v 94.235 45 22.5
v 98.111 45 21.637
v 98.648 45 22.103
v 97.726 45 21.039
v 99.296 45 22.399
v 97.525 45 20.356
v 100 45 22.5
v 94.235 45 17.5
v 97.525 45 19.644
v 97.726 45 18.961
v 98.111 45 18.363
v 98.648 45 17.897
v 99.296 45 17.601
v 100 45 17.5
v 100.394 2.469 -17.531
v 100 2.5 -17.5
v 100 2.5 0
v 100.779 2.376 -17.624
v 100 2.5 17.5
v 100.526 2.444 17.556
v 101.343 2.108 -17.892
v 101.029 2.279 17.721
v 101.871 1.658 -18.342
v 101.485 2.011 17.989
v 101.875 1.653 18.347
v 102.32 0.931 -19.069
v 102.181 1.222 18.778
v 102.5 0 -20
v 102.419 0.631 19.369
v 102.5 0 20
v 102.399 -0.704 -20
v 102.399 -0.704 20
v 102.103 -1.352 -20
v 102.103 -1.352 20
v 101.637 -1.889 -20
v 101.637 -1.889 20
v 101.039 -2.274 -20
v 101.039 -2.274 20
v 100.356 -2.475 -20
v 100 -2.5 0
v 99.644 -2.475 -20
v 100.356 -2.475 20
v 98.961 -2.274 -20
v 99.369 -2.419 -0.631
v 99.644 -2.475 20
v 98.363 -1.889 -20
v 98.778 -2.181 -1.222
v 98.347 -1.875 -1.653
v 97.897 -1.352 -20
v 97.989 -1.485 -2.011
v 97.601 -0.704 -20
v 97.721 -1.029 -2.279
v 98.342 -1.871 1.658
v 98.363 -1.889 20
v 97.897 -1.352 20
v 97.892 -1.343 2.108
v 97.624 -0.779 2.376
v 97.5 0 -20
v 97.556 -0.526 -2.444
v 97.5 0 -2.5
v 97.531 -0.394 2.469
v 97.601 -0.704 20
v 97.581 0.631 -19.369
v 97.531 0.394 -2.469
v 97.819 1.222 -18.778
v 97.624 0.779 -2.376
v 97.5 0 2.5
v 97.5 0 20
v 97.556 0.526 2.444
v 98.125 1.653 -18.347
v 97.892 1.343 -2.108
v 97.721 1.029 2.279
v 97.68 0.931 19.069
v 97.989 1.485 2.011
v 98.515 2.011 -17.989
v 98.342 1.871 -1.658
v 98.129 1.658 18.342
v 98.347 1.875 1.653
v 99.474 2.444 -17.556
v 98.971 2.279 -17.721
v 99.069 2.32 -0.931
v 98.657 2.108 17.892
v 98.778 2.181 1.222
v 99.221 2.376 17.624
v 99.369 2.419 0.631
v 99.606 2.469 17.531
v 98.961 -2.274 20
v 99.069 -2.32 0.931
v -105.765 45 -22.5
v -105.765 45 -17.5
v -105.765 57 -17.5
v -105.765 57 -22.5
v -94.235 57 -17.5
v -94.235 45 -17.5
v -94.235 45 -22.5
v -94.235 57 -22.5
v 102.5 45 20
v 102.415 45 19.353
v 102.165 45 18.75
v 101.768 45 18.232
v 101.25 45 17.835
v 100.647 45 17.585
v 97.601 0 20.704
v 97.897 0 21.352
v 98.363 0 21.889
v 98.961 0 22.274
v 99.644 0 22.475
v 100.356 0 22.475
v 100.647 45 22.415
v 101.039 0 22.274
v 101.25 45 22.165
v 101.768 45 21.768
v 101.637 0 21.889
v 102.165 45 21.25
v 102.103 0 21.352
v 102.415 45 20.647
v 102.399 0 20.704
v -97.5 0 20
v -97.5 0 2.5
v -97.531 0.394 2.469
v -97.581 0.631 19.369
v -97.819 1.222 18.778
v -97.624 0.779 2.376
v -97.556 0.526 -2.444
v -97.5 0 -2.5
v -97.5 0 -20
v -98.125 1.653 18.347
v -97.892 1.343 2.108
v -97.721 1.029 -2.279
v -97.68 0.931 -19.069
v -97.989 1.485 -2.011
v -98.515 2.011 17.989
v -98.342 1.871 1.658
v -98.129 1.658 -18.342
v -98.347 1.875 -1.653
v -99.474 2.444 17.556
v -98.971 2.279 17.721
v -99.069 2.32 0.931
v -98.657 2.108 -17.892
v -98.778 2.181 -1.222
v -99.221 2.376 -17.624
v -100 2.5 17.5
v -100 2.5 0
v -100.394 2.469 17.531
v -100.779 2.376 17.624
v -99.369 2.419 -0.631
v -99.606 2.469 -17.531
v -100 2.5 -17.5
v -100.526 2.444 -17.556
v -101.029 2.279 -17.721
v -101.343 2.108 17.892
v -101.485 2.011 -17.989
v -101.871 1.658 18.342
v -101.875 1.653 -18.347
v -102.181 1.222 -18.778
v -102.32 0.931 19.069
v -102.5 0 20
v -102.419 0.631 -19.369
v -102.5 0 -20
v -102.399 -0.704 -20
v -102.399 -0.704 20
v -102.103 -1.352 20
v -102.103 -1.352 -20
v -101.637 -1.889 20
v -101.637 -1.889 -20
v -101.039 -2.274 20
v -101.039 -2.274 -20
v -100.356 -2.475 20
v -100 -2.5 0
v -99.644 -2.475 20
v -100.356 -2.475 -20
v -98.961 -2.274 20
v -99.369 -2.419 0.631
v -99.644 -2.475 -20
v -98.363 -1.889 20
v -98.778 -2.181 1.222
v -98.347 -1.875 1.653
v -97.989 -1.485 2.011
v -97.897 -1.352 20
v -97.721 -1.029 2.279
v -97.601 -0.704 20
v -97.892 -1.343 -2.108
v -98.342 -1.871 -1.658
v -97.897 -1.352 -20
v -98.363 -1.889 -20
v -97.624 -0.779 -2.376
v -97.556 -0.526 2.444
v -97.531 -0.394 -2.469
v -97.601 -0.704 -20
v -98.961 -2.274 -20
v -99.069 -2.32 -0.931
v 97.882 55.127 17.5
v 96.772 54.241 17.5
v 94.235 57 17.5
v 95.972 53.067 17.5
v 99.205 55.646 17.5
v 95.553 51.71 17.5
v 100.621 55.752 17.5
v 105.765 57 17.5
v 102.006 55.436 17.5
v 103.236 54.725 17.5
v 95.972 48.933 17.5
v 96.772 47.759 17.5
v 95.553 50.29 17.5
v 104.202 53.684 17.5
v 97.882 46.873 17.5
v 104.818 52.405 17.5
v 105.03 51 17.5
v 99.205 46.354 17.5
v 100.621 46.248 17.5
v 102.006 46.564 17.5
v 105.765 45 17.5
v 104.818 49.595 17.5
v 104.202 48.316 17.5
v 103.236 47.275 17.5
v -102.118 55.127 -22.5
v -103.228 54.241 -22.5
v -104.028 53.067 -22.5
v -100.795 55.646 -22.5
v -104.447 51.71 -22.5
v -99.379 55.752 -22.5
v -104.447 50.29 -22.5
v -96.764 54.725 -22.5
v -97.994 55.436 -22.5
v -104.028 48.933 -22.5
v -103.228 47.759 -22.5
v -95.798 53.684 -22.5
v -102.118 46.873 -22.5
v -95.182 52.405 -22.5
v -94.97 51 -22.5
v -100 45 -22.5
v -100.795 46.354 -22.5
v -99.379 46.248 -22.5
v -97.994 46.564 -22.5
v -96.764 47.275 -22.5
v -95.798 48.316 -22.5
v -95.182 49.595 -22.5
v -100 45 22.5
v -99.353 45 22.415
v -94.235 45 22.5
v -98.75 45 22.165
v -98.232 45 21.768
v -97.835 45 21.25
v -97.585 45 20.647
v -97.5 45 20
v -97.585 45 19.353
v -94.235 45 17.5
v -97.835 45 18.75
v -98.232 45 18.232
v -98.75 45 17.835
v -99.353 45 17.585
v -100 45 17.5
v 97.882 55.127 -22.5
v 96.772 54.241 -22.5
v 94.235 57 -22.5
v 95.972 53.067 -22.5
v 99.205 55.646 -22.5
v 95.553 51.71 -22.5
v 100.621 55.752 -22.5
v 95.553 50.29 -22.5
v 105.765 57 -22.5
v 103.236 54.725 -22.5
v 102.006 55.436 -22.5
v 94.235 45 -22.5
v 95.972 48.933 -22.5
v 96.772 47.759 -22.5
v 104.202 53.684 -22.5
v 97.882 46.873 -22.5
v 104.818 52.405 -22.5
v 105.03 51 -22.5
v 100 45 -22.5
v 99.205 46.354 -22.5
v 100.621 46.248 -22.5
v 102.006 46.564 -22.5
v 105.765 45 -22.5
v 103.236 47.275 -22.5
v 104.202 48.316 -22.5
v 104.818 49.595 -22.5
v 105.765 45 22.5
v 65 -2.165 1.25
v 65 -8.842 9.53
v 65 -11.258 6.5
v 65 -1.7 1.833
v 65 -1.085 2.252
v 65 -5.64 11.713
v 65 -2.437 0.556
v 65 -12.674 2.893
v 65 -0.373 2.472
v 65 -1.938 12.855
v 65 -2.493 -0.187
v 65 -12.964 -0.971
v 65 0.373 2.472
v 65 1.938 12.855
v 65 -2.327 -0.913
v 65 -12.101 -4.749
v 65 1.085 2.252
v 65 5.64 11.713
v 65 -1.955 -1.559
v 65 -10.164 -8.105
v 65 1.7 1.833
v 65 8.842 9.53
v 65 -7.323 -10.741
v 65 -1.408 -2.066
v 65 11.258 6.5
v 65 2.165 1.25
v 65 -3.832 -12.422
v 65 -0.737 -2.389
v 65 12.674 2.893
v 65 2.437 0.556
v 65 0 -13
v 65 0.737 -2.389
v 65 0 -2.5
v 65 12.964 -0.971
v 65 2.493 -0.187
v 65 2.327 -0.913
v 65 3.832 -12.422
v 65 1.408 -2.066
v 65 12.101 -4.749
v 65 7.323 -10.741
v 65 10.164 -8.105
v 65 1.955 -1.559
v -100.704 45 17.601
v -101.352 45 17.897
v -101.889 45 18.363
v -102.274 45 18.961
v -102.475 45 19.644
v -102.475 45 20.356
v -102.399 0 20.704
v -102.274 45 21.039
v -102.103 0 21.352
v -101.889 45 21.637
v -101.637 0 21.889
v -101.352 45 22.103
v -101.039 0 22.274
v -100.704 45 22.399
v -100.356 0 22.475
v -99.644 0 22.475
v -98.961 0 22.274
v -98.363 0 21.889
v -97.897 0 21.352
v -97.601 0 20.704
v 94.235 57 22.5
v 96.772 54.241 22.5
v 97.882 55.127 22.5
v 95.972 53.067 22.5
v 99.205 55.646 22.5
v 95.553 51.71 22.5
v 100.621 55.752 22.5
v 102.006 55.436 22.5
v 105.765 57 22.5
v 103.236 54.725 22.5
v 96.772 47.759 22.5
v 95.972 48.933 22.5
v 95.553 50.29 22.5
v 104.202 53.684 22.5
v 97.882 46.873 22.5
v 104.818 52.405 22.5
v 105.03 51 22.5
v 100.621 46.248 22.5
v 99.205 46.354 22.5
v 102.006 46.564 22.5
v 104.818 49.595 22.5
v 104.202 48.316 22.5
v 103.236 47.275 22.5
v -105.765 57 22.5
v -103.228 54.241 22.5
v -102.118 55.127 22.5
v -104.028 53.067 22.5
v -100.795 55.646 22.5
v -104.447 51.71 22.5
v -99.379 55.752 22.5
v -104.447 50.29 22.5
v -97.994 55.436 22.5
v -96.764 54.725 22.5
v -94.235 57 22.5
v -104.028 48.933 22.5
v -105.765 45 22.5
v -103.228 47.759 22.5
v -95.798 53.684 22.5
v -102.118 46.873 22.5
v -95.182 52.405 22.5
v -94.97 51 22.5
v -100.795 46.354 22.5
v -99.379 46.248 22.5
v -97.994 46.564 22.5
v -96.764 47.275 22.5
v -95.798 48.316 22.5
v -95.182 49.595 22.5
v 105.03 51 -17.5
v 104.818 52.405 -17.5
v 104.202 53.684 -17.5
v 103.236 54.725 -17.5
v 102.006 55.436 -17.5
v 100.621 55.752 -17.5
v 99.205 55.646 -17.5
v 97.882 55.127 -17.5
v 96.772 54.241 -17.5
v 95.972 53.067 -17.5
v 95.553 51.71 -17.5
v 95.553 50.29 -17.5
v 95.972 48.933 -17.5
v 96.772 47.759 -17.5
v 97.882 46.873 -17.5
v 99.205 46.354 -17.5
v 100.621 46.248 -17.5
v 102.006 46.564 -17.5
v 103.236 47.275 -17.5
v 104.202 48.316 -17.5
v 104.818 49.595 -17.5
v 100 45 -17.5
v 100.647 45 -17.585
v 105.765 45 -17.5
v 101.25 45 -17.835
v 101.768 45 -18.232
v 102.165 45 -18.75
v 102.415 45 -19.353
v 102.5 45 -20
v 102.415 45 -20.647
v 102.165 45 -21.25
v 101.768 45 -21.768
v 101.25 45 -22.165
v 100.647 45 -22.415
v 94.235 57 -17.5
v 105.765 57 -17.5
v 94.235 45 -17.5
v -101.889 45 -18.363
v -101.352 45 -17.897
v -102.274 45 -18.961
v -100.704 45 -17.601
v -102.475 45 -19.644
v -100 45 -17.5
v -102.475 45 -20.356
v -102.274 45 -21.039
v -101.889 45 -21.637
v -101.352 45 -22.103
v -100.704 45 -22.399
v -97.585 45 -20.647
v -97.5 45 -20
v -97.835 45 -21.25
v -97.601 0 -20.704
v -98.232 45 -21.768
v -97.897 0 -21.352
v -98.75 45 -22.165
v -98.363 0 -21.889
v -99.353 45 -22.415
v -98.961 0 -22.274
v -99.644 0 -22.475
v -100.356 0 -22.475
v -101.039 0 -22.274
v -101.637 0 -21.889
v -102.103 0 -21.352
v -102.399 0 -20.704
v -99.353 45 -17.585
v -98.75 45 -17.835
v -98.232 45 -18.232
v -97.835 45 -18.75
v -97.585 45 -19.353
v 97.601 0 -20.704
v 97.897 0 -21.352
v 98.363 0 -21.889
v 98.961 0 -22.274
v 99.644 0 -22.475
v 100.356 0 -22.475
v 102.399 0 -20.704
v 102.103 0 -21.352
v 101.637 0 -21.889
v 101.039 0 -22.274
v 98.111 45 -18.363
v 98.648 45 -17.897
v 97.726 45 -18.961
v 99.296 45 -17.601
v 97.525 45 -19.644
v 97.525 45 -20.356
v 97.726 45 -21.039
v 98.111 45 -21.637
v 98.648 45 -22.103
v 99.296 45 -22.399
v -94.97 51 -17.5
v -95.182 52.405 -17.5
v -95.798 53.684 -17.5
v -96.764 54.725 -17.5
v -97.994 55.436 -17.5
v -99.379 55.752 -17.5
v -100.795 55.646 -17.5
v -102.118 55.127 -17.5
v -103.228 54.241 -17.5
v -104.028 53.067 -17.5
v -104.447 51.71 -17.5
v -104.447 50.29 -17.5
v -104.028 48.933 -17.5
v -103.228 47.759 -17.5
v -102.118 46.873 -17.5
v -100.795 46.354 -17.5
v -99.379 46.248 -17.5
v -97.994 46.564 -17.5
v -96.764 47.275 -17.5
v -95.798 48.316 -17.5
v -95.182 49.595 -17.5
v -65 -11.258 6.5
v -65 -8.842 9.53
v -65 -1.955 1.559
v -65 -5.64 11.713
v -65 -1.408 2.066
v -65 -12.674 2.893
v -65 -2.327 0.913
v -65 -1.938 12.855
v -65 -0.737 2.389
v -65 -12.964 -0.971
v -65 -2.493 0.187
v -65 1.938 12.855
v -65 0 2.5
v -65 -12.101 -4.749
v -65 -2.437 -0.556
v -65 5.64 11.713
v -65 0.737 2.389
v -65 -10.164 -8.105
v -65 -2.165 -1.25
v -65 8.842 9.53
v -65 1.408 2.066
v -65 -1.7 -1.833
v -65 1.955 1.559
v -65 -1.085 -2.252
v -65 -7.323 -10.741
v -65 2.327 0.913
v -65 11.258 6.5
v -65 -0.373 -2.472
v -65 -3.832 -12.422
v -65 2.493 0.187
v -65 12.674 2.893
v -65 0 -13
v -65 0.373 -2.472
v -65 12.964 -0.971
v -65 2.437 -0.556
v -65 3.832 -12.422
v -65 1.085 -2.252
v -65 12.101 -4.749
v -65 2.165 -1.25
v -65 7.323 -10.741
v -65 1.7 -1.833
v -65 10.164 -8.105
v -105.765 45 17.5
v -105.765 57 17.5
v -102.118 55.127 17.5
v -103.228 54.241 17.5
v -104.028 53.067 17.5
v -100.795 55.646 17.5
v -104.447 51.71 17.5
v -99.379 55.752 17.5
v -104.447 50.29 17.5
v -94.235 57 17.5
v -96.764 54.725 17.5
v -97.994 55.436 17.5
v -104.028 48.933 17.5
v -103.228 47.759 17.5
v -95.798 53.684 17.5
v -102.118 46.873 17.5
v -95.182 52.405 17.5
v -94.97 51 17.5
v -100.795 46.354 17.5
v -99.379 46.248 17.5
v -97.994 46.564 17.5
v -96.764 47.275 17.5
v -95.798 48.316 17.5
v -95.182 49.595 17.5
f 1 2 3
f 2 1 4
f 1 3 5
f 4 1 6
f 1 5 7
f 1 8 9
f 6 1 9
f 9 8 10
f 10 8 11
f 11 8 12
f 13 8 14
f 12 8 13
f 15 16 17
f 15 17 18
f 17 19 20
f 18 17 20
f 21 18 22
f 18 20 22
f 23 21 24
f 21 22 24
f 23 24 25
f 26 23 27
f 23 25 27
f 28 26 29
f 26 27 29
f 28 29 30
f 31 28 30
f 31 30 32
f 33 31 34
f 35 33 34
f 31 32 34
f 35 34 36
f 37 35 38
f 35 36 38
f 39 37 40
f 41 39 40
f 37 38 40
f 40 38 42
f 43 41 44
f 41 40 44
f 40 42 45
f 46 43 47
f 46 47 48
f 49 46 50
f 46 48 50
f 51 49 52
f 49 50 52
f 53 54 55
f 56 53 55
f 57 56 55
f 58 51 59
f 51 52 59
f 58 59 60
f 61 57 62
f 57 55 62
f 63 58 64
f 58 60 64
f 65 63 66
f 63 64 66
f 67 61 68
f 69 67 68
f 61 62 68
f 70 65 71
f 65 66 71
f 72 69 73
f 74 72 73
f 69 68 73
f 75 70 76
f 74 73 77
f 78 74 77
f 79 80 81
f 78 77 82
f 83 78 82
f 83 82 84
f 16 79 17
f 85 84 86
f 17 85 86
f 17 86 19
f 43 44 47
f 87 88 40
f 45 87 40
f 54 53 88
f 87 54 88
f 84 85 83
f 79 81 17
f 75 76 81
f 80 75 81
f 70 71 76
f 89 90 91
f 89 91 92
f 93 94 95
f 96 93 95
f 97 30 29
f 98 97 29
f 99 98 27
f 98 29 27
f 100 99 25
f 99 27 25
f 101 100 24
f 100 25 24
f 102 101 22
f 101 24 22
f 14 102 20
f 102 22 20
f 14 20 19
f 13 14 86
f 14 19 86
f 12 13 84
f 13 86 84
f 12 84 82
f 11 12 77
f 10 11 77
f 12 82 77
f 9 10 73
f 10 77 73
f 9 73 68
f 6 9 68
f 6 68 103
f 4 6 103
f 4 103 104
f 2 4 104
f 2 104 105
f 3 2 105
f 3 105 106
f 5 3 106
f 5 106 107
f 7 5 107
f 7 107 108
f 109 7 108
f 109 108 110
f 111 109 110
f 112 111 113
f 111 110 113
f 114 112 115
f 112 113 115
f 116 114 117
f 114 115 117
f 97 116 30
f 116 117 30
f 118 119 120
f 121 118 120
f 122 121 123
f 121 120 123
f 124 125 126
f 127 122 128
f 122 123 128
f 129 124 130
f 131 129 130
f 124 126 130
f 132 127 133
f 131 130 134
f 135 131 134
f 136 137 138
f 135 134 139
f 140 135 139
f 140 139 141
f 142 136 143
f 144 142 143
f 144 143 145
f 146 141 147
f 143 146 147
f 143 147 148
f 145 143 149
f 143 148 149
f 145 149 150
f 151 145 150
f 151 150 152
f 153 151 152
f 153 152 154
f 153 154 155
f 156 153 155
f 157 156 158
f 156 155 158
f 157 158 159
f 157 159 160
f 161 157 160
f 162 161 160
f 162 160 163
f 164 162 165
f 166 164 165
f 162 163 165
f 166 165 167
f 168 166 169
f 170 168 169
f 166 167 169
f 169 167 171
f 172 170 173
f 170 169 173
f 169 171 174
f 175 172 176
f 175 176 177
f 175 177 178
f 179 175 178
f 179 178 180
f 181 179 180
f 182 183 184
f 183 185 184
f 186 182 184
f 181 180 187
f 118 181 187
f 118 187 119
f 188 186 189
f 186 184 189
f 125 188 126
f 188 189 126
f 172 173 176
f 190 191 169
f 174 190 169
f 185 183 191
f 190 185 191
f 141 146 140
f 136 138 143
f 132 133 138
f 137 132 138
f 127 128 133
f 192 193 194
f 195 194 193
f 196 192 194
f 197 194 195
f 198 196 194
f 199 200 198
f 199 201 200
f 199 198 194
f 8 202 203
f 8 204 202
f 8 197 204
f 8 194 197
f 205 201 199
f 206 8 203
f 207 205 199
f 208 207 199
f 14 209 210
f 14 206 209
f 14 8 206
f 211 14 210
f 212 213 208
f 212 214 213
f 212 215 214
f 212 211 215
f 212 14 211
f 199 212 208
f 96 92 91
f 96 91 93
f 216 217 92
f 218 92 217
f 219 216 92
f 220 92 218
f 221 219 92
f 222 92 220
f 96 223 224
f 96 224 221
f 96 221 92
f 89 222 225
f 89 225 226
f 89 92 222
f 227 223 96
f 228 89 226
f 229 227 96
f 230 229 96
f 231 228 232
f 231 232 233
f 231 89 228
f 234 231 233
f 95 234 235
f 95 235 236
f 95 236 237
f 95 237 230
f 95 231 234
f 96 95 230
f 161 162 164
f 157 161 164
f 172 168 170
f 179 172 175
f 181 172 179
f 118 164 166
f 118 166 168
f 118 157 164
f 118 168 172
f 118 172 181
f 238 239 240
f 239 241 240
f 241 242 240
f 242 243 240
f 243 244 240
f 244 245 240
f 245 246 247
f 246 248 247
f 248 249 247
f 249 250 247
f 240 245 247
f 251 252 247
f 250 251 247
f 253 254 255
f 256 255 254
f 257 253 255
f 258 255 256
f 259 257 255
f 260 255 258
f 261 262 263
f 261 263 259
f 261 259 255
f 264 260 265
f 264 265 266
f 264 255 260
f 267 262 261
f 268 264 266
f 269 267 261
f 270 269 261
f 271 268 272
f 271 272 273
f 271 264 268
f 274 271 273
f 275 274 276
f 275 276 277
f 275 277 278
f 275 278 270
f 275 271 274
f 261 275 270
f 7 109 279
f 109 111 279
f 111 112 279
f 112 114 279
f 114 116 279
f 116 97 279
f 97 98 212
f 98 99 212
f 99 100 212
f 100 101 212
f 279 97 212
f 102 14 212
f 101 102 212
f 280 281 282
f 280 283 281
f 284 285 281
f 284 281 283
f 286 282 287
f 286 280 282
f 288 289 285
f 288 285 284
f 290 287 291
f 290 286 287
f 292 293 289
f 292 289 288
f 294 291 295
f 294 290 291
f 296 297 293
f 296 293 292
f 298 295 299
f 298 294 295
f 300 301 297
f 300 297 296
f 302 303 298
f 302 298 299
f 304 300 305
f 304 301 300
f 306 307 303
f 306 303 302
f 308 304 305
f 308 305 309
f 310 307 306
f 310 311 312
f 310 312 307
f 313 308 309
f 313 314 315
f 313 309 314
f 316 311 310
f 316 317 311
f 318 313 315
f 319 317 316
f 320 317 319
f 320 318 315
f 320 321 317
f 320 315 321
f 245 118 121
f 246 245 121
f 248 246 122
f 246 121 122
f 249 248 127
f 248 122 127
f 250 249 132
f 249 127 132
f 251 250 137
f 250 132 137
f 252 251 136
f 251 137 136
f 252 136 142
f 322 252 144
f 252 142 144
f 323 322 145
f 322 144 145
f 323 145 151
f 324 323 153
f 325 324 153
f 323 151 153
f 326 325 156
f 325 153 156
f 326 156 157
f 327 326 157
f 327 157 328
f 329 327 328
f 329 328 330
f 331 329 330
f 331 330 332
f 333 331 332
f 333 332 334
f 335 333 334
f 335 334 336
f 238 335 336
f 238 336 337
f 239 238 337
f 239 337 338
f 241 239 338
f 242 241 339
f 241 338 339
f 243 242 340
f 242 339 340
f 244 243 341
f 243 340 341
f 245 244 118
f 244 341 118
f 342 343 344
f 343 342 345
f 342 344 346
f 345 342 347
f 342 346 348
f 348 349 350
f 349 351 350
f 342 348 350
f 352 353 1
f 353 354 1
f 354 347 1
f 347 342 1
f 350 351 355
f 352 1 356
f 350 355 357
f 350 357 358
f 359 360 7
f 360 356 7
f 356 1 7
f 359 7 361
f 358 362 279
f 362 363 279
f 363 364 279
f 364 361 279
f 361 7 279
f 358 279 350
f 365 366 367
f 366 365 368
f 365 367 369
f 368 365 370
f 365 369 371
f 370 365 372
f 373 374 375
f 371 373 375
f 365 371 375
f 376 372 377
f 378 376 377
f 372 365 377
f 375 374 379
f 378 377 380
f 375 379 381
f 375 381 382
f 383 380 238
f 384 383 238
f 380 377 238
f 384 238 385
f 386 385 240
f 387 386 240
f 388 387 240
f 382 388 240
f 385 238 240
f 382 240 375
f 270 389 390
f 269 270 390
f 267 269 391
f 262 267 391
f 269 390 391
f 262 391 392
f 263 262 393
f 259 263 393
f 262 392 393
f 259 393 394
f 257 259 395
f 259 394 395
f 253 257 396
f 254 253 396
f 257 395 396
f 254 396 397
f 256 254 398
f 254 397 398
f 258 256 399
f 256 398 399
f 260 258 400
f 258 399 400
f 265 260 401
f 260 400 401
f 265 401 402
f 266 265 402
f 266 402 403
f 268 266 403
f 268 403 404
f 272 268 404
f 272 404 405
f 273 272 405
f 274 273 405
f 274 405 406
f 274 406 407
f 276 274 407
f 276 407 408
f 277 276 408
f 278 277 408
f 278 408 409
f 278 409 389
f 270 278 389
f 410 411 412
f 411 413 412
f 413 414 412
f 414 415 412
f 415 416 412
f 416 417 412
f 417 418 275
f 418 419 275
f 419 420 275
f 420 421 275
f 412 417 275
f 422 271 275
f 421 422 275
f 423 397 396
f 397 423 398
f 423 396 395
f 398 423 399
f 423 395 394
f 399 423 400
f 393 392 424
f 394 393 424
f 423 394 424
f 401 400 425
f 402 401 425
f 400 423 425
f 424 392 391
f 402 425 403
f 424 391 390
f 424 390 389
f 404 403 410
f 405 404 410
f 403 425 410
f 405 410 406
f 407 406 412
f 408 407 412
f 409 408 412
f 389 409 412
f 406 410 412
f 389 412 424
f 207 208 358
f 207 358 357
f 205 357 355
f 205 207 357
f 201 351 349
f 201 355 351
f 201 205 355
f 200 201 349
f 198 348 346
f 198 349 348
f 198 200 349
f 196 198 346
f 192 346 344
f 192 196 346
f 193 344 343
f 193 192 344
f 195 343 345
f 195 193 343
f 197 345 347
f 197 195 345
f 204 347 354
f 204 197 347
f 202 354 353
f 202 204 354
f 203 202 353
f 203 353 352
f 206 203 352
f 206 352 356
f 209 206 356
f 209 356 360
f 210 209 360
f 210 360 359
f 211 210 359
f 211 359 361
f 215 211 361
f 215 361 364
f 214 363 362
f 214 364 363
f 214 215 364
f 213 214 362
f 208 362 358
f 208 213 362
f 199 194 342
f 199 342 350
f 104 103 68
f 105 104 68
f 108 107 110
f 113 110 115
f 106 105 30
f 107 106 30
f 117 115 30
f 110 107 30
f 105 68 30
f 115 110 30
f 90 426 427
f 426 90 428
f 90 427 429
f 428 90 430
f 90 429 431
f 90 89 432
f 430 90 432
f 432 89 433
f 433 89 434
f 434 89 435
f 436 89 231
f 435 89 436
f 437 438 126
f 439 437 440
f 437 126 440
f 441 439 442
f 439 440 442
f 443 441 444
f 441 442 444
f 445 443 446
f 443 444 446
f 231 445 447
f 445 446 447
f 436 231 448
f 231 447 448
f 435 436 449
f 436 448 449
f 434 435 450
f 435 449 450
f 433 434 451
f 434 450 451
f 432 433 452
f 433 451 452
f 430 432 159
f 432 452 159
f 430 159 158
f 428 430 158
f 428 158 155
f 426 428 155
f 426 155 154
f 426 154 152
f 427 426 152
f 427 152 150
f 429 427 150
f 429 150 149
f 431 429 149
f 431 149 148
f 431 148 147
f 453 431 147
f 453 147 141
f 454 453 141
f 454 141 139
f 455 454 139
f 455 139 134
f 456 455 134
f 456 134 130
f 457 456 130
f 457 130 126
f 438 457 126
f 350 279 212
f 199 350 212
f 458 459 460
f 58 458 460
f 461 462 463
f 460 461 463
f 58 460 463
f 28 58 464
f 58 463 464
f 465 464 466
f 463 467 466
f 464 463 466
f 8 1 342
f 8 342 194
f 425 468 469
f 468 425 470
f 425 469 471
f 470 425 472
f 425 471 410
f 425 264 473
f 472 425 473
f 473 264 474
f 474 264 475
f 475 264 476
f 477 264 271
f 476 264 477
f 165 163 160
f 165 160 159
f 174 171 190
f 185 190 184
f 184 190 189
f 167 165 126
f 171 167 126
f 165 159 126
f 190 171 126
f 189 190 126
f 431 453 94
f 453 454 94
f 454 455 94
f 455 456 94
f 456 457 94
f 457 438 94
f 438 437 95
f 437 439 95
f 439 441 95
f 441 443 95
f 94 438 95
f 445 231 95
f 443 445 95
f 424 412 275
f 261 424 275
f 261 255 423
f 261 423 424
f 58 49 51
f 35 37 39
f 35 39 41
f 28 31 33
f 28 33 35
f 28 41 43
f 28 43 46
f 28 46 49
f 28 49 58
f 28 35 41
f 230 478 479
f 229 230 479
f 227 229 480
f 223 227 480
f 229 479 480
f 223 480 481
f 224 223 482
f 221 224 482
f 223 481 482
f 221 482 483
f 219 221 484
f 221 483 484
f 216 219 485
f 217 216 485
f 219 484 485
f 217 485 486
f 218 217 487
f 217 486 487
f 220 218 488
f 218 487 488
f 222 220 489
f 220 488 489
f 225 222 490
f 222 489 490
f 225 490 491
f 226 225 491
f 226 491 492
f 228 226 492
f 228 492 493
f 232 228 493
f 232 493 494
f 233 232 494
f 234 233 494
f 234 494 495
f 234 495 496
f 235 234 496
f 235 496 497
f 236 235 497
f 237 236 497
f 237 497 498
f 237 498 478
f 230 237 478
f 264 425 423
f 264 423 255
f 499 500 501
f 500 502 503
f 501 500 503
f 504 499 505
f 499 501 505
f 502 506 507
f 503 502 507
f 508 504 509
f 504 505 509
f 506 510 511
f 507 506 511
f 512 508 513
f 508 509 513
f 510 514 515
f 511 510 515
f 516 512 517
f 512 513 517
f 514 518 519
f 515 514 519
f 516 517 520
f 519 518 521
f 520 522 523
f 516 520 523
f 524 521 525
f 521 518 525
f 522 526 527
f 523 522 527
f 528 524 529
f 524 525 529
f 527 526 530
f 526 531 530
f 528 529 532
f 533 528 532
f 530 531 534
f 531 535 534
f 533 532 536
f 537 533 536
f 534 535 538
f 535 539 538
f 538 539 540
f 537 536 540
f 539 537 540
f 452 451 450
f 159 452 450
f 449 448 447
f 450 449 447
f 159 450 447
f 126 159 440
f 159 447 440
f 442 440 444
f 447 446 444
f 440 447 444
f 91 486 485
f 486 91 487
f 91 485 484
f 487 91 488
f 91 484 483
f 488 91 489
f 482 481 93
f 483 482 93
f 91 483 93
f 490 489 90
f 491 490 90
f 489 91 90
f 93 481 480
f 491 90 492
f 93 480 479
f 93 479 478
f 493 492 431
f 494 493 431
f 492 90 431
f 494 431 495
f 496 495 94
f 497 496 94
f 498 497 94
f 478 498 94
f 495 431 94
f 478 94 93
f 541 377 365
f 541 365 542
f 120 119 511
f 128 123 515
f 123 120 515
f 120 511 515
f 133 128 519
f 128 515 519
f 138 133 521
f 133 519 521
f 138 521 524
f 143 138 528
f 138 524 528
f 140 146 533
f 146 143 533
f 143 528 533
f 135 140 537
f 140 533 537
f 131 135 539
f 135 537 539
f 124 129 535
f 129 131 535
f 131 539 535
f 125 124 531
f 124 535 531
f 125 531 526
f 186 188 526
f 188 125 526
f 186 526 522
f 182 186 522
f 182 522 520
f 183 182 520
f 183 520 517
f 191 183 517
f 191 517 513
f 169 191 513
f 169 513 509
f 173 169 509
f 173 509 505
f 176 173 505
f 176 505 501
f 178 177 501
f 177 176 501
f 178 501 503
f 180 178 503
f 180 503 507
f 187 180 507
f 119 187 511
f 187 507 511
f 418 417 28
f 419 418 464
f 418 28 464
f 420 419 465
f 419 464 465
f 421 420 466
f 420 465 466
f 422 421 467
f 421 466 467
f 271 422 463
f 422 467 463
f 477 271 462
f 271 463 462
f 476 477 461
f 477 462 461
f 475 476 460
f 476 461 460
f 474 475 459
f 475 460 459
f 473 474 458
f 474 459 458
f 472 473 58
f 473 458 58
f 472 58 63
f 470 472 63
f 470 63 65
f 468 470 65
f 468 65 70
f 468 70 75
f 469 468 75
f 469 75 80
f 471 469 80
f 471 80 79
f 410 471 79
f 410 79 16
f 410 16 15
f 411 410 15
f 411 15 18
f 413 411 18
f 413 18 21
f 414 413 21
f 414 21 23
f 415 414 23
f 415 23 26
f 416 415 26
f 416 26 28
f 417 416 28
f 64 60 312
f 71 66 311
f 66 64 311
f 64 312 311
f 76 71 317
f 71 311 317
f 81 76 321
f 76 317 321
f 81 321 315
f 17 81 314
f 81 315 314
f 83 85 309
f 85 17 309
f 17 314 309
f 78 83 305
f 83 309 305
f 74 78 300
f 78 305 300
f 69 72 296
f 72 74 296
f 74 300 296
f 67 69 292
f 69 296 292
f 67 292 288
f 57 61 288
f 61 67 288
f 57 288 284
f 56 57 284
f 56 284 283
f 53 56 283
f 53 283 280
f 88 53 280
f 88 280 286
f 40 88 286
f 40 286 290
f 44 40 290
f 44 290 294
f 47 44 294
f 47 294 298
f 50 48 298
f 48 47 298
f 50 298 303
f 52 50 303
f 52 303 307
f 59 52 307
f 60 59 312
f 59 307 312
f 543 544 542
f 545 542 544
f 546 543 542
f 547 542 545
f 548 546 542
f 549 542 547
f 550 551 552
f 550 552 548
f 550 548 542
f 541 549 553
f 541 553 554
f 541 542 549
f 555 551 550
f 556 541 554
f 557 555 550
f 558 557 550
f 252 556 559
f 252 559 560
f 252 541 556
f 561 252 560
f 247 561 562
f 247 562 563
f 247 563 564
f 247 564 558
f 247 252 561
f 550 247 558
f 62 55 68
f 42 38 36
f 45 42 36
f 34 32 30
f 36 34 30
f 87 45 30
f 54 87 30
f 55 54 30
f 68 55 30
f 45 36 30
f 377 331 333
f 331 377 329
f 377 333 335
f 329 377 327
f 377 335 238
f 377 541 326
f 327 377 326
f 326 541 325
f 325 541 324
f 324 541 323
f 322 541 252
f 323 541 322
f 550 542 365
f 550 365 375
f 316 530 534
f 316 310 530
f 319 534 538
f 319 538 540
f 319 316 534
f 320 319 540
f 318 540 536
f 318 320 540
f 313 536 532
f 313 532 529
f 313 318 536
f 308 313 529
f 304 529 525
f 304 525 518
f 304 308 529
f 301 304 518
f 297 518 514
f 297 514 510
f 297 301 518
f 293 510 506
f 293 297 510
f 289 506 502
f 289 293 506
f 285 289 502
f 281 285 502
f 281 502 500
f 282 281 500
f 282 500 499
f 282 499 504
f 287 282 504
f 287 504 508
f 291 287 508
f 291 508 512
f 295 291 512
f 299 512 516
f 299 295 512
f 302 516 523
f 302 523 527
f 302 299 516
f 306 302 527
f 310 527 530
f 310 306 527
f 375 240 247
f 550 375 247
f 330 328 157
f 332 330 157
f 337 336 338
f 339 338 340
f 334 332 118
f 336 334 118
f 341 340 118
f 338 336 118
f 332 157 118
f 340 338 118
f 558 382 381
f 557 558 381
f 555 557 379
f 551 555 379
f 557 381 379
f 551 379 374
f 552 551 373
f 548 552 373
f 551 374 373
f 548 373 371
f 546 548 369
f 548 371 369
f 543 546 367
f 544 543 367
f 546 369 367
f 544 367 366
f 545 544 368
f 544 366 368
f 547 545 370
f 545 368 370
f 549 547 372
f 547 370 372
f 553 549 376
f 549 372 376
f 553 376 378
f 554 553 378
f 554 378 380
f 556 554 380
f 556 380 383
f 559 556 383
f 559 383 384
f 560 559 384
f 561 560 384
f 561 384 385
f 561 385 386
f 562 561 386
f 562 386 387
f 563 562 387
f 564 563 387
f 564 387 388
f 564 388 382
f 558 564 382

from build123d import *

# Parameters (mm, degrees)
BOSS_EXTRUDE1_DEPTH       = 65
BOSS_EXTRUDE1_DEPTH_BACK  = 65
SKETCH1_R                 = 13
SKETCH6_R                 = 2.5
BOSS_EXTRUDE5_DEPTH       = 35
BOSS_EXTRUDE6_START       = 35
SKETCH7_R                 = 2.5
BOSS_EXTRUDE6_DEPTH       = 35
BOSS_EXTRUDE7_DEPTH       = 20
BOSS_EXTRUDE7_DEPTH_BACK  = 20
SKETCH10_R                = 2.5
SKETCH11_R                = 2.5
BOSS_EXTRUDE8_DEPTH       = 45
SKETCH12_W                = 11.53
SKETCH12_H                = 5
BOSS_EXTRUDE9_DEPTH       = 12
CUT_EXTRUDE2_DEPTH        = 66
CUT_EXTRUDE2_DEPTH_BACK   = 12
SKETCH13_R                = 4.765
BOSS_EXTRUDE10_DEPTH      = 20
BOSS_EXTRUDE10_DEPTH_BACK = 20
SKETCH14_R                = 2.5
SKETCH15_R                = 2.5
BOSS_EXTRUDE11_DEPTH      = 45
SKETCH16_W                = 11.53
SKETCH16_H                = 5
BOSS_EXTRUDE12_DEPTH      = 12
CUT_EXTRUDE3_DEPTH        = 12
CUT_EXTRUDE3_DEPTH_BACK   = 51
SKETCH17_R                = 4.765


with BuildPart() as part:
    # Sketch1 → Boss-Extrude1 (new, two sides: drawn at the far end of the back side and taken through both)
    with BuildSketch(Plane(origin=(0, 0, 0), x_dir=(0, 0, -1), z_dir=(1, 0, 0)).offset(-BOSS_EXTRUDE1_DEPTH_BACK)):
        Circle(SKETCH1_R)
    extrude(amount=BOSS_EXTRUDE1_DEPTH + BOSS_EXTRUDE1_DEPTH_BACK)

    # Sketch6 → Boss-Extrude5 (add)
    with BuildSketch(Plane(origin=(65, 0, 0), x_dir=(0, 0, -1), z_dir=(1, 0, 0))):
        Circle(SKETCH6_R)
    extrude(amount=BOSS_EXTRUDE5_DEPTH)

    # Sketch7 → Boss-Extrude6 (add)
    with BuildSketch(Plane.ZY.offset(65).offset(BOSS_EXTRUDE6_START)):
        Circle(SKETCH7_R)
    extrude(amount=-BOSS_EXTRUDE6_DEPTH)

    # Sketch10 → Boss-Extrude7 (add, two sides: drawn at the far end of the back side and taken through both)
    with BuildSketch(Plane.YX.offset(-BOSS_EXTRUDE7_DEPTH_BACK)):
        with Locations((0, 100)):
            Circle(SKETCH10_R)
    extrude(amount=BOSS_EXTRUDE7_DEPTH + BOSS_EXTRUDE7_DEPTH_BACK)

    # Sketch11 → Boss-Extrude8 (add)
    with BuildSketch(Plane(origin=(0, 0, 0), x_dir=(1, 0, 0), z_dir=(0, 1, 0))):
        with Locations((100, -20)):
            Circle(SKETCH11_R)
        with Locations((100, 20)):
            Circle(SKETCH11_R)
    extrude(amount=BOSS_EXTRUDE8_DEPTH)

    # Sketch12 → Boss-Extrude9 (add)
    with BuildSketch(Plane(origin=(0, 45, 0), x_dir=(1, 0, 0), z_dir=(0, 1, 0))):
        with Locations((100, -20)):
            Rectangle(SKETCH12_W, SKETCH12_H)
        with Locations((100, 20)):
            Rectangle(SKETCH12_W, SKETCH12_H)
    extrude(amount=BOSS_EXTRUDE9_DEPTH)

    # Sketch13 → Cut-Extrude2 (cut, two sides: drawn at the far end of the back side and taken through both)
    with BuildSketch(Plane.XY.offset(-17.5).offset(-CUT_EXTRUDE2_DEPTH_BACK)):
        with Locations((100.265, 51)):
            Circle(SKETCH13_R)
    extrude(amount=CUT_EXTRUDE2_DEPTH + CUT_EXTRUDE2_DEPTH_BACK, mode=Mode.SUBTRACT)

    # Sketch14 → Boss-Extrude10 (add, two sides: drawn at the far end of the back side and taken through both)
    with BuildSketch(Plane.XY.offset(-BOSS_EXTRUDE10_DEPTH_BACK)):
        with Locations((-100, 0)):
            Circle(SKETCH14_R)
    extrude(amount=BOSS_EXTRUDE10_DEPTH + BOSS_EXTRUDE10_DEPTH_BACK)

    # Sketch15 → Boss-Extrude11 (add)
    with BuildSketch(Plane(origin=(0, 0, 0), x_dir=(1, 0, 0), z_dir=(0, 1, 0))):
        with Locations((-100, 20)):
            Circle(SKETCH15_R)
        with Locations((-100, -20)):
            Circle(SKETCH15_R)
    extrude(amount=BOSS_EXTRUDE11_DEPTH)

    # Sketch16 → Boss-Extrude12 (add)
    with BuildSketch(Plane(origin=(0, 45, 0), x_dir=(1, 0, 0), z_dir=(0, 1, 0))):
        with Locations((-100, -20)):
            Rectangle(SKETCH16_W, SKETCH16_H)
        with Locations((-100, 20)):
            Rectangle(SKETCH16_W, SKETCH16_H)
    extrude(amount=BOSS_EXTRUDE12_DEPTH)

    # Sketch17 → Cut-Extrude3 (cut, two sides: drawn at the far end of the back side and taken through both)
    with BuildSketch(Plane.XY.offset(22.5).offset(-CUT_EXTRUDE3_DEPTH_BACK)):
        with Locations((-99.735, 51)):
            Circle(SKETCH17_R)
    extrude(amount=CUT_EXTRUDE3_DEPTH + CUT_EXTRUDE3_DEPTH_BACK, mode=Mode.SUBTRACT)


solid = part.part
